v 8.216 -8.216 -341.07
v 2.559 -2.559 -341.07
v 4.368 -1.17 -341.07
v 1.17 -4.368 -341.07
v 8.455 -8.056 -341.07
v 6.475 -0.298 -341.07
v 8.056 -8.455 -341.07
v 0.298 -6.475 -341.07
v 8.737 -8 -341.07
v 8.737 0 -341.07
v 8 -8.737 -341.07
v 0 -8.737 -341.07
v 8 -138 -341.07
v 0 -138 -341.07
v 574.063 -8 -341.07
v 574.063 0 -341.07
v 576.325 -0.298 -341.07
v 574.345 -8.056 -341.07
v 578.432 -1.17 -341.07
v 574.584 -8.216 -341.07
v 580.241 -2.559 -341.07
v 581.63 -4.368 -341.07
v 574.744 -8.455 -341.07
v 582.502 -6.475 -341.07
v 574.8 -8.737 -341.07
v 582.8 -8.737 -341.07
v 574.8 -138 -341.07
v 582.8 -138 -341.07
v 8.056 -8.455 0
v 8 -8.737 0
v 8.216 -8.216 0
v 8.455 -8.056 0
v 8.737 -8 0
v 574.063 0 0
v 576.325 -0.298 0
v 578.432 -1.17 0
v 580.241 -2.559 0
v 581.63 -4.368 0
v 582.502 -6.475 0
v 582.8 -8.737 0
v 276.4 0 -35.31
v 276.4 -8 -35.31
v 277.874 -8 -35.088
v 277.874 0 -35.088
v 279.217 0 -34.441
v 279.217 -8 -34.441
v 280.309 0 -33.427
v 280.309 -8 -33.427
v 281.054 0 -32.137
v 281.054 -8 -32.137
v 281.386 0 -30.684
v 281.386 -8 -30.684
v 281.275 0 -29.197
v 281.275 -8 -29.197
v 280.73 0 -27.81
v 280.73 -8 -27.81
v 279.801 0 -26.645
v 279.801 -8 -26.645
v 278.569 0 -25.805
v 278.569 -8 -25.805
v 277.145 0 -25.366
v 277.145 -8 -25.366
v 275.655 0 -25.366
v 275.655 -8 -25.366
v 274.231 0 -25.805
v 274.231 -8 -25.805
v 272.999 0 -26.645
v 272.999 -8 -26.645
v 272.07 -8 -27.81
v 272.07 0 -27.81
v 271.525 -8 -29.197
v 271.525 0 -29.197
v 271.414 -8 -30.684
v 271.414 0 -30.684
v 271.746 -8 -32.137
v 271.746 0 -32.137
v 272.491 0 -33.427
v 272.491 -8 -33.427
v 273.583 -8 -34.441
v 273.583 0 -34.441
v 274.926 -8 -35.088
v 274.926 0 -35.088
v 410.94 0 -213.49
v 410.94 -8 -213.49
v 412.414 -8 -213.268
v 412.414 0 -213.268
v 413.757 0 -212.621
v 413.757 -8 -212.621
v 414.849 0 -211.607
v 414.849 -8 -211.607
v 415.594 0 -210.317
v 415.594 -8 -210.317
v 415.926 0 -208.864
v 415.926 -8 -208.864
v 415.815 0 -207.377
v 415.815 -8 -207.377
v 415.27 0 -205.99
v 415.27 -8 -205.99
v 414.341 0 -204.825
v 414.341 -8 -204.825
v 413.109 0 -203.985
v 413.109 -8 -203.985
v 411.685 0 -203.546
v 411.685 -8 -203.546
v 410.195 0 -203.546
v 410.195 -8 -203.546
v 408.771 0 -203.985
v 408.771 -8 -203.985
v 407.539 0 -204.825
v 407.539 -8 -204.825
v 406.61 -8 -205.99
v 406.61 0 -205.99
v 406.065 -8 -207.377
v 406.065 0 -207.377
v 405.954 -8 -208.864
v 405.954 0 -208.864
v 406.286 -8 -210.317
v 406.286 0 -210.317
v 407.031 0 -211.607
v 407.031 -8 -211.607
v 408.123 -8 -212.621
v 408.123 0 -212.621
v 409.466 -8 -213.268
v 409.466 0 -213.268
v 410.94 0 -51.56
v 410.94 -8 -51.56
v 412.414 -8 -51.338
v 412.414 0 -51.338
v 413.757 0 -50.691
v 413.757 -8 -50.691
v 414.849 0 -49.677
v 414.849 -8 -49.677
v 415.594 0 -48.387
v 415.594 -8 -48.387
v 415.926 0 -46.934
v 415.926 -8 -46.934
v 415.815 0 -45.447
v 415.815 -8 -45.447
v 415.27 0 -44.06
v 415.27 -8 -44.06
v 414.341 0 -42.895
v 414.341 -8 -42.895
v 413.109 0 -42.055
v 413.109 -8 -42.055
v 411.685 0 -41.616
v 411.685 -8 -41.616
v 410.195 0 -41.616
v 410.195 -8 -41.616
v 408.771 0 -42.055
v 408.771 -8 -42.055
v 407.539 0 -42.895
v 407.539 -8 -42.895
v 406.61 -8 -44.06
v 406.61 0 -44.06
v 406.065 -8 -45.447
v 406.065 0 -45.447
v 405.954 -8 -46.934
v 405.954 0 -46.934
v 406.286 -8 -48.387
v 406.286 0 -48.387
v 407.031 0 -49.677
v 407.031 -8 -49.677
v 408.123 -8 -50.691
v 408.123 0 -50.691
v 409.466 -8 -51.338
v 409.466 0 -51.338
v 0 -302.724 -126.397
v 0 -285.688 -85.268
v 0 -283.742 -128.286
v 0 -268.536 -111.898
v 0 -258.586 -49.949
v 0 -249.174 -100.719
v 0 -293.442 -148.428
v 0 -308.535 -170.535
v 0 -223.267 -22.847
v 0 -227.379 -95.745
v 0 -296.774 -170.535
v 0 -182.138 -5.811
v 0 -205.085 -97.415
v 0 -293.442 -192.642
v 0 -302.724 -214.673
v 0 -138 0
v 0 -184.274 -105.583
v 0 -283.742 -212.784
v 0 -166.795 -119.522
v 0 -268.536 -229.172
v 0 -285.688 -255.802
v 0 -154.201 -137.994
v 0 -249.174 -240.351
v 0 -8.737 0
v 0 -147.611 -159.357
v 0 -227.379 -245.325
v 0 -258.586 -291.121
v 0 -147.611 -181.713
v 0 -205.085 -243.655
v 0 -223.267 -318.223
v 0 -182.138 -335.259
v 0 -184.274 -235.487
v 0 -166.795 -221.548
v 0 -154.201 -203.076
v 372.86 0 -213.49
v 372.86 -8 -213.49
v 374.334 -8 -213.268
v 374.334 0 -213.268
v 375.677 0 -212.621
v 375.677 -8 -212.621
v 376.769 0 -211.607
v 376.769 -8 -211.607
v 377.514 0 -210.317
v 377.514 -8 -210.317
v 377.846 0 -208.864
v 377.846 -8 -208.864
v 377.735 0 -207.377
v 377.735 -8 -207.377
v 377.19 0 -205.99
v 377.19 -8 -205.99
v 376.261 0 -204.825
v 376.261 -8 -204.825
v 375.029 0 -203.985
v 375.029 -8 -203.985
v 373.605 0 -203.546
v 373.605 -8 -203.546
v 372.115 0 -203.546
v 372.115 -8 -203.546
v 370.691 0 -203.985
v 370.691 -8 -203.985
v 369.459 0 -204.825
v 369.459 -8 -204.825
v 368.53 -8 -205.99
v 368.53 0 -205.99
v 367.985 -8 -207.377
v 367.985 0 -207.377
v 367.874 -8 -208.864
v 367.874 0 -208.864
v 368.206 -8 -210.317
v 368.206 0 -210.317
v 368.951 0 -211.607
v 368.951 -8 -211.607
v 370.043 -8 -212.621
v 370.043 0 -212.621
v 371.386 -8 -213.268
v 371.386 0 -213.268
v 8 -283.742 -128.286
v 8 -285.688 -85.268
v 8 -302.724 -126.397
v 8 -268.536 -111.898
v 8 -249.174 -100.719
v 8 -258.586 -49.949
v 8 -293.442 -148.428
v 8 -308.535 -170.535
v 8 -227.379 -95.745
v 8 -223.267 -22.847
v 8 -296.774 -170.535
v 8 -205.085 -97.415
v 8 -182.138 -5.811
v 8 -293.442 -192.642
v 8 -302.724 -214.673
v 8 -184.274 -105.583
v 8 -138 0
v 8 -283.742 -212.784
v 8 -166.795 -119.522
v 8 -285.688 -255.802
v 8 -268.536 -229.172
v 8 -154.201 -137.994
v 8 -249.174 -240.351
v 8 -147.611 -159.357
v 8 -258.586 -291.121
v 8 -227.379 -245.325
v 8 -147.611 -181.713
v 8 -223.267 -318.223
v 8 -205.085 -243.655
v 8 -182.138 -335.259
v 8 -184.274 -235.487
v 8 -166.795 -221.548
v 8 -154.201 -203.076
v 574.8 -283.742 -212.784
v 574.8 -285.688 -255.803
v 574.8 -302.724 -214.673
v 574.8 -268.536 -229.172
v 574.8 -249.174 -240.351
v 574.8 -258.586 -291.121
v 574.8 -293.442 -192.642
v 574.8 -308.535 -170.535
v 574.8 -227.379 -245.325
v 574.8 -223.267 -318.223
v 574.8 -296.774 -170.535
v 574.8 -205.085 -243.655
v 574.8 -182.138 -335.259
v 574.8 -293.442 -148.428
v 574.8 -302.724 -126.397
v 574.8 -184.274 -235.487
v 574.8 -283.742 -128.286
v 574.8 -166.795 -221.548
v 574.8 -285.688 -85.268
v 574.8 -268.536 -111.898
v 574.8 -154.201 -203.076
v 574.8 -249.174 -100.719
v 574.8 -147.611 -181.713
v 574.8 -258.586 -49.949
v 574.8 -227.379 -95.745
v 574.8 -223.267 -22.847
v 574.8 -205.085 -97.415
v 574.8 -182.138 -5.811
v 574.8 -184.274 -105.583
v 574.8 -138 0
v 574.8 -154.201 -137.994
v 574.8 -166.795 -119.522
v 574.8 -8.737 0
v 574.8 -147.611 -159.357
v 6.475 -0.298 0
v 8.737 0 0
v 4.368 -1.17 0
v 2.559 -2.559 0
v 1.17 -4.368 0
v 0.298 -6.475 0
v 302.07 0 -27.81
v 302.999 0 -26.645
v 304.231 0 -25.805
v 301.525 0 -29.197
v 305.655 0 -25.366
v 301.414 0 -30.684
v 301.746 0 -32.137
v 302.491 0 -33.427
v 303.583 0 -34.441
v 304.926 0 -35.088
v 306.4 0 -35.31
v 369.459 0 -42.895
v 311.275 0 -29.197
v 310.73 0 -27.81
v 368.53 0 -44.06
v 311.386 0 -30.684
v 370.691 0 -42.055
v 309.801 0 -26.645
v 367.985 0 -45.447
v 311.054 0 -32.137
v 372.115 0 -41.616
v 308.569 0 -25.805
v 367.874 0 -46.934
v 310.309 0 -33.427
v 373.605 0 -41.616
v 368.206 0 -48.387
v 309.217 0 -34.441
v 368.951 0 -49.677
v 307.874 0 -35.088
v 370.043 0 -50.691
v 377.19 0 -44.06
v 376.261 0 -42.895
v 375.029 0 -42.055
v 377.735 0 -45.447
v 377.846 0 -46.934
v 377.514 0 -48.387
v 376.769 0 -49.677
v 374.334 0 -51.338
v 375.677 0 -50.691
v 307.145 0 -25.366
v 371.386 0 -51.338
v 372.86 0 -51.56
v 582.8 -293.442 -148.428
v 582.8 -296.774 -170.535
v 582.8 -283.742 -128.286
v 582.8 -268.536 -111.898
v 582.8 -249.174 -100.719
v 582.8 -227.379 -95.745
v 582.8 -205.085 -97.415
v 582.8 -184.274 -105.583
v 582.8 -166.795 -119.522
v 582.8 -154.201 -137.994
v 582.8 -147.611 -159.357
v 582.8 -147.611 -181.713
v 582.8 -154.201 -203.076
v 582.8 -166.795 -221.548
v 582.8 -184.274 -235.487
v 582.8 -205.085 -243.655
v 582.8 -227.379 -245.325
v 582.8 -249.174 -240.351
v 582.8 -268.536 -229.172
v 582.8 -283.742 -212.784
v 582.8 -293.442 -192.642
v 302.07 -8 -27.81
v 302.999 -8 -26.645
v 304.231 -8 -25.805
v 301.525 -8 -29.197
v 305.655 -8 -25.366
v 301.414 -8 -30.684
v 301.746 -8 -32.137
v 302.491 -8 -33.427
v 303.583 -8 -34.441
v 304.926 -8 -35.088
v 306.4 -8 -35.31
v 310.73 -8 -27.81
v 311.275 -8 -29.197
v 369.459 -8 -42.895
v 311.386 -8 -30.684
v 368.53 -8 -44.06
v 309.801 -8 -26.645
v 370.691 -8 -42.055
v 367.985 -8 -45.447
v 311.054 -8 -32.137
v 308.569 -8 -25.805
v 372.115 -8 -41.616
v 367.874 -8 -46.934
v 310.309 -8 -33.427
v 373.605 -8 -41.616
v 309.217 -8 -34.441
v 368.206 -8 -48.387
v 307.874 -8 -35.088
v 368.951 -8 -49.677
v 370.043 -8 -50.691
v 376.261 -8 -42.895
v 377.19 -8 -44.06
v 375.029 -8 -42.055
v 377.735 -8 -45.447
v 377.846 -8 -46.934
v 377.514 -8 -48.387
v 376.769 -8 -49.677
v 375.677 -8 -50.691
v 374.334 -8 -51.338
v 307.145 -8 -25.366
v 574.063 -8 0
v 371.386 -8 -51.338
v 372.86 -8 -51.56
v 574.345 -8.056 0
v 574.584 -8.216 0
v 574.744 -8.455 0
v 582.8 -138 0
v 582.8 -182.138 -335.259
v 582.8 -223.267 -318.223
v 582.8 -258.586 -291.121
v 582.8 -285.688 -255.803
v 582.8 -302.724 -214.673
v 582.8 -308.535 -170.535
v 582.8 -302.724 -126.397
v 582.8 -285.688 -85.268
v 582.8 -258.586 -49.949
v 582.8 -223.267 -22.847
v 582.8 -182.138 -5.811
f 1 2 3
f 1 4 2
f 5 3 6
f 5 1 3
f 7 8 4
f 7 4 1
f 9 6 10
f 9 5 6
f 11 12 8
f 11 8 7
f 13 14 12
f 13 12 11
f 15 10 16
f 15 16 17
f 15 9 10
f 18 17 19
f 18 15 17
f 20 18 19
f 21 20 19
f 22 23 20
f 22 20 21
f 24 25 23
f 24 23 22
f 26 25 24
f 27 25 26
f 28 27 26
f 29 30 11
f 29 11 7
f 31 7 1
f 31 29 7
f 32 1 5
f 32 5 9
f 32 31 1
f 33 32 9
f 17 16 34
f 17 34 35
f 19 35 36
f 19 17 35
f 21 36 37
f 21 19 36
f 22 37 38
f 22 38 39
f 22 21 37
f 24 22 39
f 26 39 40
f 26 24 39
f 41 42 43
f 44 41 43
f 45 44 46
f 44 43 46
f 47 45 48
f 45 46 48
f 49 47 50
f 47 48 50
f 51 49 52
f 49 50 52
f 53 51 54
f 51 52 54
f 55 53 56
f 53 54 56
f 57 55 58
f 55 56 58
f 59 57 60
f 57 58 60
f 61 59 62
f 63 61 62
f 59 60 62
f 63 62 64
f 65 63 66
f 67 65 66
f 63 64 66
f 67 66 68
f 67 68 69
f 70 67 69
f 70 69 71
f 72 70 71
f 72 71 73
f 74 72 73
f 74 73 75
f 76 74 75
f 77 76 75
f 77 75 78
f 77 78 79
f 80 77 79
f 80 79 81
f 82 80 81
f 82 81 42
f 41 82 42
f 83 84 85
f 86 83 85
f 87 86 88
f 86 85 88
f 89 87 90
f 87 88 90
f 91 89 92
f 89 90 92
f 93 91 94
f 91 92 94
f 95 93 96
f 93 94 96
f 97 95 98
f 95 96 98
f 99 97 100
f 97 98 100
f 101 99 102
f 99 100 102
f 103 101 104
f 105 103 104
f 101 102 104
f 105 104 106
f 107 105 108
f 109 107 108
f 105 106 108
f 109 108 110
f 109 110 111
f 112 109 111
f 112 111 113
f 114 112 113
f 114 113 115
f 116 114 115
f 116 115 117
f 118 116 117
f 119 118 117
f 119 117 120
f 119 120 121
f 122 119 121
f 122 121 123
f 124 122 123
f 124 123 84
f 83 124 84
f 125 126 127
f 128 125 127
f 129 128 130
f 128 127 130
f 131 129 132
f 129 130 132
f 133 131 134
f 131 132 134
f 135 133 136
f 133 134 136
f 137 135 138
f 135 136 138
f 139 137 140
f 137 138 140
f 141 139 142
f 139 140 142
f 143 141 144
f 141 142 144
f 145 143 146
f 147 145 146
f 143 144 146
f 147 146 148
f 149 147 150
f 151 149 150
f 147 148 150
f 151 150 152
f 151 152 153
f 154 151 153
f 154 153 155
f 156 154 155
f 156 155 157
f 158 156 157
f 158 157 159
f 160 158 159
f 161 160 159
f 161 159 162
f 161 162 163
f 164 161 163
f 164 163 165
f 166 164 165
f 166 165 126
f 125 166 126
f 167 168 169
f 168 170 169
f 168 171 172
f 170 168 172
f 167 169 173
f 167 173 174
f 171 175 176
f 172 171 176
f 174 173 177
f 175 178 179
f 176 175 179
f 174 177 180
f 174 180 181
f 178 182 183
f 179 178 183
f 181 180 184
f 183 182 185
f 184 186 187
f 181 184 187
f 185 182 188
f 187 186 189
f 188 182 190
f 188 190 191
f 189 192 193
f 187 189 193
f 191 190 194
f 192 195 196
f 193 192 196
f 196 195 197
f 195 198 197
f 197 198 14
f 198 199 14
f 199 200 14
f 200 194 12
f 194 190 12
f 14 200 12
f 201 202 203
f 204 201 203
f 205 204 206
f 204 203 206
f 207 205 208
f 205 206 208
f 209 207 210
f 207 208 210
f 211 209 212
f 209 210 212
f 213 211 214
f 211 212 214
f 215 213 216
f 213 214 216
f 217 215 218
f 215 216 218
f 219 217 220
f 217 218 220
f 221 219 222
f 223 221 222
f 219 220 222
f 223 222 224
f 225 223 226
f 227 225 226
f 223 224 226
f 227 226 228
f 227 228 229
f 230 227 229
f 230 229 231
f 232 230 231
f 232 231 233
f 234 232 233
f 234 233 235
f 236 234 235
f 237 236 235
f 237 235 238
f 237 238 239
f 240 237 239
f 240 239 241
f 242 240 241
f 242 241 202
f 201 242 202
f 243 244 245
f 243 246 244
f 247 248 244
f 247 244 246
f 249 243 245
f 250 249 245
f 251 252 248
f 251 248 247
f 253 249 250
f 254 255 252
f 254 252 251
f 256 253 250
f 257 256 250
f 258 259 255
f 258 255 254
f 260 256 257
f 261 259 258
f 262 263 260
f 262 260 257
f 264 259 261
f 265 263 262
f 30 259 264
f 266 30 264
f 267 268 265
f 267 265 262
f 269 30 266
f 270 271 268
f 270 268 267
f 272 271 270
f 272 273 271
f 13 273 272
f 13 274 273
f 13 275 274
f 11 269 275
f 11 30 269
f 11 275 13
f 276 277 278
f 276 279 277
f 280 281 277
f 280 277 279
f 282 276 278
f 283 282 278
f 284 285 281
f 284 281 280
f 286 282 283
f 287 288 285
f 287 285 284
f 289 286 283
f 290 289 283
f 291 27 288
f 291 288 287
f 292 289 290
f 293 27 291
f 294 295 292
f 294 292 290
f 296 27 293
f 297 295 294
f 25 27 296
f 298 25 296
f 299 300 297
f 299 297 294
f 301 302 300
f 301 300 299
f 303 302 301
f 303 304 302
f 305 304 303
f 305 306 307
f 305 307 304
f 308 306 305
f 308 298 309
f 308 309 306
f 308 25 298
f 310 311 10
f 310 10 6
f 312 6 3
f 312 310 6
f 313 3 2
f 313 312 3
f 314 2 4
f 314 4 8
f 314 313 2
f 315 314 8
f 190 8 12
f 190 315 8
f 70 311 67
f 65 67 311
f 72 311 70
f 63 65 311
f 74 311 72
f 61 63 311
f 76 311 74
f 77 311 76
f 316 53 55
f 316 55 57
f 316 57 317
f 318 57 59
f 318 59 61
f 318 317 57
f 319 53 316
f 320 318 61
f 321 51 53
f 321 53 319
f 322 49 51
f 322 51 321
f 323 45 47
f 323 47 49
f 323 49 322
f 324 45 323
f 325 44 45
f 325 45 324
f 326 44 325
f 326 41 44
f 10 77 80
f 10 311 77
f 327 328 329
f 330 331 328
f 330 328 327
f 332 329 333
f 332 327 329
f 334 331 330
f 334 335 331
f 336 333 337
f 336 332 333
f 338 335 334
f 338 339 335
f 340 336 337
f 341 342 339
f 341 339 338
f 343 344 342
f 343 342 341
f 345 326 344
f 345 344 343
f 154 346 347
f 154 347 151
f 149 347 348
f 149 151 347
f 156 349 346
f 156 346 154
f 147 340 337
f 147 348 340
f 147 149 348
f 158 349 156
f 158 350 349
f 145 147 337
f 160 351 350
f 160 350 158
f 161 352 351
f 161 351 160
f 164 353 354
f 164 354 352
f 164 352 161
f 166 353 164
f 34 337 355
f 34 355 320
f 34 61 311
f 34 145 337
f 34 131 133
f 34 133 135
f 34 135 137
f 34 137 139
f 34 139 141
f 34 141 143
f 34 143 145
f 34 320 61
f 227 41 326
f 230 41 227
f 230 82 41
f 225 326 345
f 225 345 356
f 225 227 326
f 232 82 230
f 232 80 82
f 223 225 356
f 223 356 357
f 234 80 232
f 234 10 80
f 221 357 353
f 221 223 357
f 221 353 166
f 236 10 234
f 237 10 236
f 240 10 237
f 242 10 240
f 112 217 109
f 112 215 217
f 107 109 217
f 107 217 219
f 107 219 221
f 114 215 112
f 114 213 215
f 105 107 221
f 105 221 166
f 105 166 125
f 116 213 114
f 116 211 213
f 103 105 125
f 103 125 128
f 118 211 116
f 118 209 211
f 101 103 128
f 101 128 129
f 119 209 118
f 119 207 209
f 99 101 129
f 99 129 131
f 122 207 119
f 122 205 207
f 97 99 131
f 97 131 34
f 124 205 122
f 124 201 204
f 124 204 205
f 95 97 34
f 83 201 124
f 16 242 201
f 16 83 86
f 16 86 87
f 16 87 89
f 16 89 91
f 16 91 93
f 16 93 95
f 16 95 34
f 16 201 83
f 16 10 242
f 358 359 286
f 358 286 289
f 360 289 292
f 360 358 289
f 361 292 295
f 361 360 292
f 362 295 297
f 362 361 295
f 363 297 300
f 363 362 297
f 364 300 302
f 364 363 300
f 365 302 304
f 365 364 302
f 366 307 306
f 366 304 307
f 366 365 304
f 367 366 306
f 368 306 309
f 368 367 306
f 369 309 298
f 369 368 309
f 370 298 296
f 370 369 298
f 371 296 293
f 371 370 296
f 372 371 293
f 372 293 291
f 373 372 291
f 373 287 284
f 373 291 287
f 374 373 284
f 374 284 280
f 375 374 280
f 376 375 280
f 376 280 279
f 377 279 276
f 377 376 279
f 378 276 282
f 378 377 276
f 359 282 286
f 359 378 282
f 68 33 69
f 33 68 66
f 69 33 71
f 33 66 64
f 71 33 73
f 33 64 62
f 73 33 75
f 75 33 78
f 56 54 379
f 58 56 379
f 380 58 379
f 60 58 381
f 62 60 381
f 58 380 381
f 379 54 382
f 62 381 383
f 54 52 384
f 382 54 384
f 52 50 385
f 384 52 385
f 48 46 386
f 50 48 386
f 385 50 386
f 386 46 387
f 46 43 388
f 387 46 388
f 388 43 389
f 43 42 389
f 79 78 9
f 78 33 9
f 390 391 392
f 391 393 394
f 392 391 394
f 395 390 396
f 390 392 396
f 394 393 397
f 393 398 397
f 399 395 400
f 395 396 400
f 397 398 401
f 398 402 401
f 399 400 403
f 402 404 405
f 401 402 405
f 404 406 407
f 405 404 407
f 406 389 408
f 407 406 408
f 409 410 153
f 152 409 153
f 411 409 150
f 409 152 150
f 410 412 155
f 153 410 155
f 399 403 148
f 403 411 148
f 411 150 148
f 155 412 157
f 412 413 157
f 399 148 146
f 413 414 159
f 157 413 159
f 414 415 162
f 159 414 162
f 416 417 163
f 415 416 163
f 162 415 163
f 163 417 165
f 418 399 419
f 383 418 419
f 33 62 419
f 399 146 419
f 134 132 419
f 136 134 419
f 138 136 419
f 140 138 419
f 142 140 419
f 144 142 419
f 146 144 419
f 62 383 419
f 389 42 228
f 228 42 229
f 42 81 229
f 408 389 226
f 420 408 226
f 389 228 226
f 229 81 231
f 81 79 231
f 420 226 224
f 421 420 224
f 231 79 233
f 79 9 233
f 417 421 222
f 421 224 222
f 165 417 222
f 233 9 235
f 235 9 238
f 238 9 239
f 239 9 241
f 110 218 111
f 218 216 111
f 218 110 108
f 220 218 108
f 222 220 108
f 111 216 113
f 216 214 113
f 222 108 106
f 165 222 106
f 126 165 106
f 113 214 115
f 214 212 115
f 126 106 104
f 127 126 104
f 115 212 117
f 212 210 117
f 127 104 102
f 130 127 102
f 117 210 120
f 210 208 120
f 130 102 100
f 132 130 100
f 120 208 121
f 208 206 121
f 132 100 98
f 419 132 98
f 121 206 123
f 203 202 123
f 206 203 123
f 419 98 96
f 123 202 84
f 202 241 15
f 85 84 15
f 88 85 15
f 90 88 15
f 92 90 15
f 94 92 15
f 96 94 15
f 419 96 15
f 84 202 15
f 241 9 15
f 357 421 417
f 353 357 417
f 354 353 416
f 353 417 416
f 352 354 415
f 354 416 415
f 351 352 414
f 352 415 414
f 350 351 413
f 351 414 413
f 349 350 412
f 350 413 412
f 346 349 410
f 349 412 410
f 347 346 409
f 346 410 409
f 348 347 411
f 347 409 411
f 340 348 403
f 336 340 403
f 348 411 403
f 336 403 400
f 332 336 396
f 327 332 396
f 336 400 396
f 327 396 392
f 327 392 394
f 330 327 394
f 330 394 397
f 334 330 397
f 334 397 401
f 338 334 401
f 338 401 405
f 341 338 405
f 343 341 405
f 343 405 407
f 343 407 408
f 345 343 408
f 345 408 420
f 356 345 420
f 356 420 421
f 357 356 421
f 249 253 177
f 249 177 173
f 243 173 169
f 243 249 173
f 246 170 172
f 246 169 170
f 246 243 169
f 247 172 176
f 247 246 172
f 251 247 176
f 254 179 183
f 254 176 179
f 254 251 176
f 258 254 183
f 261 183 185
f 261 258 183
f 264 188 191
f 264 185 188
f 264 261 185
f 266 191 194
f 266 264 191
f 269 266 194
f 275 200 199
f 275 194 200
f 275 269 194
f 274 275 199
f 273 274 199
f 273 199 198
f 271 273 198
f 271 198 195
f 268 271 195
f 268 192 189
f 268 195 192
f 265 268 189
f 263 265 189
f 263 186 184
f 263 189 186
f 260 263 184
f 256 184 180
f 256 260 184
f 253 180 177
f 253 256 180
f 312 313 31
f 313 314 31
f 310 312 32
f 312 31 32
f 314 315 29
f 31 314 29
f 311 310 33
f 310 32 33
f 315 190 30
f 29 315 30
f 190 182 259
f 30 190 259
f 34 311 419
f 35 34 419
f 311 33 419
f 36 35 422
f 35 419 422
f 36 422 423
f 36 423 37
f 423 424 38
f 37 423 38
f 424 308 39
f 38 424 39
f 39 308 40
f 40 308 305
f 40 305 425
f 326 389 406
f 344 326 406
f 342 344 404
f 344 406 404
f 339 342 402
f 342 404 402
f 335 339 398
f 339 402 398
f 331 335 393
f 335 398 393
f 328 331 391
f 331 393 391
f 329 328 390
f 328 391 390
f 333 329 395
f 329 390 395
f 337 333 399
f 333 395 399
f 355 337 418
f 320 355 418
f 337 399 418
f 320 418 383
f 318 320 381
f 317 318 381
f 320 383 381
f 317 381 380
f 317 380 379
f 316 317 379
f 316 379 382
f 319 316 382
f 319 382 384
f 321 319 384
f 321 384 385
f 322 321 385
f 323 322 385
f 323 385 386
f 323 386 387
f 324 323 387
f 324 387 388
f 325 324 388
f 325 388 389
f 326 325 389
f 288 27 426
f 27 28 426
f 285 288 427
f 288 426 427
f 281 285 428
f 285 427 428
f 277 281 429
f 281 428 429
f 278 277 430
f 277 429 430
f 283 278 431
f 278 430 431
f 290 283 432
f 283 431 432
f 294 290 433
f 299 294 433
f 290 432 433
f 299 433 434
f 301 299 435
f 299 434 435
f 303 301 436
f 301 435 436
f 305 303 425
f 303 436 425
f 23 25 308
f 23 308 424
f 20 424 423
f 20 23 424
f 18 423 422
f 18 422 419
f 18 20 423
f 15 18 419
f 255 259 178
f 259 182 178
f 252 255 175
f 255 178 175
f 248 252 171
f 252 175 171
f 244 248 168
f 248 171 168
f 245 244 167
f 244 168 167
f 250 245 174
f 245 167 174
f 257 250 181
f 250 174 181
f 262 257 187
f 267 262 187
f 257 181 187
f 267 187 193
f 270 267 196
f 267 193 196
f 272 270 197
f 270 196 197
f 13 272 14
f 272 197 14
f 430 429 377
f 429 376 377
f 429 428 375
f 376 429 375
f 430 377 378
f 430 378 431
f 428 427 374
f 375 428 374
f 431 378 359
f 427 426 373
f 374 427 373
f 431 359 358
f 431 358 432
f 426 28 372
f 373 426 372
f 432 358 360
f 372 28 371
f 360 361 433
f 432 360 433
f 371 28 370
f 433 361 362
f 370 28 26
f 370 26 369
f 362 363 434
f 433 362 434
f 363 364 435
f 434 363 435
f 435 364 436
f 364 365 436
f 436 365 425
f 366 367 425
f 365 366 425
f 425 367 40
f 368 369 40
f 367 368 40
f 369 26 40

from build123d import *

# Parameters (mm, degrees)
SKETCH2_W                      = 582.8
SKETCH2_H                      = 341.07
BASE_FLANGE5_DEPTH             = 8
EDGE_FLANGE2_STRIP_W           = 33.4732
EDGE_FLANGE2_STRIP_H           = 8
EDGE_FLANGE2_STRIP_CUT_DEPTH   = 341.07
EDGE_FLANGE2_STRIP_2_W         = 33.4732
EDGE_FLANGE2_STRIP_2_H         = 8
EDGE_FLANGE2_STRIP_CUT_2_DEPTH = 341.07
EDGE_FLANGE2_DEPTH             = 341.07
EDGE_FLANGE2_BEND_DEPTH        = 341.07
BOSS_EXTRUDE4_DEPTH            = 4
F_10_0MM_DOWEL_HOLE1_D         = 10
BOSS_EXTRUDE5_DEPTH            = 4
CUT_EXTRUDE2_DEPTH             = 743.413921694
CUT_EXTRUDE2_DEPTH_BACK        = 743.413921694
SKETCH40_R                     = 75
F_10_0MM_DOWEL_HOLE2_D         = 10
F_10_0MM_DOWEL_HOLE3_D         = 10


# Sheet-metal steps are written as plain solids
with BuildPart() as part:
    # Sketch2 → Base-Flange5 (new body)
    with BuildSketch(Plane(origin=(0, 0, 0), x_dir=(1, 0, 0), z_dir=(0, 1, 0))):
        with Locations((291.4, 170.535)):
            Rectangle(SKETCH2_W, SKETCH2_H)
    extrude(amount=-BASE_FLANGE5_DEPTH)

    # Edge-Flange2 strip (across the edge) → Edge-Flange2 strip cut (cut)
    with BuildSketch(Plane(origin=(0, -8, 0), x_dir=(1, 0, 0), z_dir=(0, 0, -1))):
        with Locations((-8, -4)):
            Rectangle(EDGE_FLANGE2_STRIP_W, EDGE_FLANGE2_STRIP_H)
    extrude(amount=EDGE_FLANGE2_STRIP_CUT_DEPTH, mode=Mode.SUBTRACT)

    # Edge-Flange2 strip 2 (across the edge) → Edge-Flange2 strip cut 2 (cut)
    with BuildSketch(Plane(origin=(582.8, -8, -341.07), x_dir=(-1, 0, 0), z_dir=(0, 0, 1))):
        with Locations((-8, -4)):
            Rectangle(EDGE_FLANGE2_STRIP_2_W, EDGE_FLANGE2_STRIP_2_H)
    extrude(amount=EDGE_FLANGE2_STRIP_CUT_2_DEPTH, mode=Mode.SUBTRACT)

    # Edge-Flange2 section (across the edge) → Edge-Flange2 (add)
    with BuildSketch(Plane(origin=(0, -8, 0), x_dir=(1, 0, 0), z_dir=(0, 0, -1))):
        with BuildLine():
            Line((0, 0.7366), (0, 130))
            Line((0, 130), (8, 130))
            Line((8, 130), (8, 0.7366))
            ThreePointArc((8, 0.7366), (8.215745145, 0.215745145), (8.7366, 0))
            Line((8.7366, 0), (8.7366, -8))
            ThreePointArc((8.7366, -8), (2.558890895, -5.441109105), (0, 0.7366))
        make_face()
    extrude(amount=EDGE_FLANGE2_DEPTH)

    # Edge-Flange2 section 2 (across the edge) → Edge-Flange2 bend (add)
    with BuildSketch(Plane(origin=(582.8, -8, -341.07), x_dir=(-1, 0, 0), z_dir=(0, 0, 1))):
        with BuildLine():
            Line((0, 0.7366), (0, 130))
            Line((0, 130), (8, 130))
            Line((8, 130), (8, 0.7366))
            ThreePointArc((8, 0.7366), (8.215745145, 0.215745145), (8.7366, 0))
            Line((8.7366, 0), (8.7366, -8))
            ThreePointArc((8.7366, -8), (2.558890895, -5.441109105), (0, 0.7366))
        make_face()
    extrude(amount=EDGE_FLANGE2_BEND_DEPTH)

    # Sketch39 → Boss-Extrude4 (add, symmetric)
    with BuildSketch(Plane.ZY.offset(-4)):
        with BuildLine():
            Line((-341.07, -138), (0, -138))
            ThreePointArc((0, -138), (-170.535, -308.535), (-341.07, -138))
        make_face()
    extrude(amount=BOSS_EXTRUDE4_DEPTH, both=True)

    # Ø10.0mm Dowel Hole1 (through all)
    with Locations(Plane(origin=(306.4, 0, -30.31), x_dir=(0, 0, 1), z_dir=(0, 1, 0))):
        with Locations((0, 0), (0, -30)):
            Hole(F_10_0MM_DOWEL_HOLE1_D / 2)

    # Sketch46 → Boss-Extrude5 (add, symmetric)
    with BuildSketch(Plane(origin=(578.8, 0, 0), x_dir=(0, 0, -1), z_dir=(1, 0, 0))):
        with BuildLine():
            Line((0, -138), (341.07, -138))
            ThreePointArc((341.07, -138), (170.535, -308.535), (0, -138))
        make_face()
    extrude(amount=BOSS_EXTRUDE5_DEPTH, both=True)

    # Sketch40 → Cut-Extrude2 (cut, two sides: drawn at the far end of the back side and taken through both)
    with BuildSketch(Plane.ZY.offset(-CUT_EXTRUDE2_DEPTH_BACK)):
        with Locations(Location((-170.535, -221.773804428, 0), (0, 0, 270))):
            Circle(SKETCH40_R)
    extrude(amount=CUT_EXTRUDE2_DEPTH + CUT_EXTRUDE2_DEPTH_BACK, mode=Mode.SUBTRACT)

    # Ø10.0mm Dowel Hole2 (through all)
    with Locations(Plane(origin=(372.86, 0, -46.56), x_dir=(0, 0, 1), z_dir=(0, 1, 0))):
        with Locations((0, 0), (0, 38.08)):
            Hole(F_10_0MM_DOWEL_HOLE2_D / 2)

    # Ø10.0mm Dowel Hole3 (through all)
    with Locations(Plane(origin=(410.94, 0, -208.49), x_dir=(0, 0, 1), z_dir=(0, 1, 0))):
        with Locations((0, 0), (0, -38.08)):
            Hole(F_10_0MM_DOWEL_HOLE3_D / 2)


solid = part.part
